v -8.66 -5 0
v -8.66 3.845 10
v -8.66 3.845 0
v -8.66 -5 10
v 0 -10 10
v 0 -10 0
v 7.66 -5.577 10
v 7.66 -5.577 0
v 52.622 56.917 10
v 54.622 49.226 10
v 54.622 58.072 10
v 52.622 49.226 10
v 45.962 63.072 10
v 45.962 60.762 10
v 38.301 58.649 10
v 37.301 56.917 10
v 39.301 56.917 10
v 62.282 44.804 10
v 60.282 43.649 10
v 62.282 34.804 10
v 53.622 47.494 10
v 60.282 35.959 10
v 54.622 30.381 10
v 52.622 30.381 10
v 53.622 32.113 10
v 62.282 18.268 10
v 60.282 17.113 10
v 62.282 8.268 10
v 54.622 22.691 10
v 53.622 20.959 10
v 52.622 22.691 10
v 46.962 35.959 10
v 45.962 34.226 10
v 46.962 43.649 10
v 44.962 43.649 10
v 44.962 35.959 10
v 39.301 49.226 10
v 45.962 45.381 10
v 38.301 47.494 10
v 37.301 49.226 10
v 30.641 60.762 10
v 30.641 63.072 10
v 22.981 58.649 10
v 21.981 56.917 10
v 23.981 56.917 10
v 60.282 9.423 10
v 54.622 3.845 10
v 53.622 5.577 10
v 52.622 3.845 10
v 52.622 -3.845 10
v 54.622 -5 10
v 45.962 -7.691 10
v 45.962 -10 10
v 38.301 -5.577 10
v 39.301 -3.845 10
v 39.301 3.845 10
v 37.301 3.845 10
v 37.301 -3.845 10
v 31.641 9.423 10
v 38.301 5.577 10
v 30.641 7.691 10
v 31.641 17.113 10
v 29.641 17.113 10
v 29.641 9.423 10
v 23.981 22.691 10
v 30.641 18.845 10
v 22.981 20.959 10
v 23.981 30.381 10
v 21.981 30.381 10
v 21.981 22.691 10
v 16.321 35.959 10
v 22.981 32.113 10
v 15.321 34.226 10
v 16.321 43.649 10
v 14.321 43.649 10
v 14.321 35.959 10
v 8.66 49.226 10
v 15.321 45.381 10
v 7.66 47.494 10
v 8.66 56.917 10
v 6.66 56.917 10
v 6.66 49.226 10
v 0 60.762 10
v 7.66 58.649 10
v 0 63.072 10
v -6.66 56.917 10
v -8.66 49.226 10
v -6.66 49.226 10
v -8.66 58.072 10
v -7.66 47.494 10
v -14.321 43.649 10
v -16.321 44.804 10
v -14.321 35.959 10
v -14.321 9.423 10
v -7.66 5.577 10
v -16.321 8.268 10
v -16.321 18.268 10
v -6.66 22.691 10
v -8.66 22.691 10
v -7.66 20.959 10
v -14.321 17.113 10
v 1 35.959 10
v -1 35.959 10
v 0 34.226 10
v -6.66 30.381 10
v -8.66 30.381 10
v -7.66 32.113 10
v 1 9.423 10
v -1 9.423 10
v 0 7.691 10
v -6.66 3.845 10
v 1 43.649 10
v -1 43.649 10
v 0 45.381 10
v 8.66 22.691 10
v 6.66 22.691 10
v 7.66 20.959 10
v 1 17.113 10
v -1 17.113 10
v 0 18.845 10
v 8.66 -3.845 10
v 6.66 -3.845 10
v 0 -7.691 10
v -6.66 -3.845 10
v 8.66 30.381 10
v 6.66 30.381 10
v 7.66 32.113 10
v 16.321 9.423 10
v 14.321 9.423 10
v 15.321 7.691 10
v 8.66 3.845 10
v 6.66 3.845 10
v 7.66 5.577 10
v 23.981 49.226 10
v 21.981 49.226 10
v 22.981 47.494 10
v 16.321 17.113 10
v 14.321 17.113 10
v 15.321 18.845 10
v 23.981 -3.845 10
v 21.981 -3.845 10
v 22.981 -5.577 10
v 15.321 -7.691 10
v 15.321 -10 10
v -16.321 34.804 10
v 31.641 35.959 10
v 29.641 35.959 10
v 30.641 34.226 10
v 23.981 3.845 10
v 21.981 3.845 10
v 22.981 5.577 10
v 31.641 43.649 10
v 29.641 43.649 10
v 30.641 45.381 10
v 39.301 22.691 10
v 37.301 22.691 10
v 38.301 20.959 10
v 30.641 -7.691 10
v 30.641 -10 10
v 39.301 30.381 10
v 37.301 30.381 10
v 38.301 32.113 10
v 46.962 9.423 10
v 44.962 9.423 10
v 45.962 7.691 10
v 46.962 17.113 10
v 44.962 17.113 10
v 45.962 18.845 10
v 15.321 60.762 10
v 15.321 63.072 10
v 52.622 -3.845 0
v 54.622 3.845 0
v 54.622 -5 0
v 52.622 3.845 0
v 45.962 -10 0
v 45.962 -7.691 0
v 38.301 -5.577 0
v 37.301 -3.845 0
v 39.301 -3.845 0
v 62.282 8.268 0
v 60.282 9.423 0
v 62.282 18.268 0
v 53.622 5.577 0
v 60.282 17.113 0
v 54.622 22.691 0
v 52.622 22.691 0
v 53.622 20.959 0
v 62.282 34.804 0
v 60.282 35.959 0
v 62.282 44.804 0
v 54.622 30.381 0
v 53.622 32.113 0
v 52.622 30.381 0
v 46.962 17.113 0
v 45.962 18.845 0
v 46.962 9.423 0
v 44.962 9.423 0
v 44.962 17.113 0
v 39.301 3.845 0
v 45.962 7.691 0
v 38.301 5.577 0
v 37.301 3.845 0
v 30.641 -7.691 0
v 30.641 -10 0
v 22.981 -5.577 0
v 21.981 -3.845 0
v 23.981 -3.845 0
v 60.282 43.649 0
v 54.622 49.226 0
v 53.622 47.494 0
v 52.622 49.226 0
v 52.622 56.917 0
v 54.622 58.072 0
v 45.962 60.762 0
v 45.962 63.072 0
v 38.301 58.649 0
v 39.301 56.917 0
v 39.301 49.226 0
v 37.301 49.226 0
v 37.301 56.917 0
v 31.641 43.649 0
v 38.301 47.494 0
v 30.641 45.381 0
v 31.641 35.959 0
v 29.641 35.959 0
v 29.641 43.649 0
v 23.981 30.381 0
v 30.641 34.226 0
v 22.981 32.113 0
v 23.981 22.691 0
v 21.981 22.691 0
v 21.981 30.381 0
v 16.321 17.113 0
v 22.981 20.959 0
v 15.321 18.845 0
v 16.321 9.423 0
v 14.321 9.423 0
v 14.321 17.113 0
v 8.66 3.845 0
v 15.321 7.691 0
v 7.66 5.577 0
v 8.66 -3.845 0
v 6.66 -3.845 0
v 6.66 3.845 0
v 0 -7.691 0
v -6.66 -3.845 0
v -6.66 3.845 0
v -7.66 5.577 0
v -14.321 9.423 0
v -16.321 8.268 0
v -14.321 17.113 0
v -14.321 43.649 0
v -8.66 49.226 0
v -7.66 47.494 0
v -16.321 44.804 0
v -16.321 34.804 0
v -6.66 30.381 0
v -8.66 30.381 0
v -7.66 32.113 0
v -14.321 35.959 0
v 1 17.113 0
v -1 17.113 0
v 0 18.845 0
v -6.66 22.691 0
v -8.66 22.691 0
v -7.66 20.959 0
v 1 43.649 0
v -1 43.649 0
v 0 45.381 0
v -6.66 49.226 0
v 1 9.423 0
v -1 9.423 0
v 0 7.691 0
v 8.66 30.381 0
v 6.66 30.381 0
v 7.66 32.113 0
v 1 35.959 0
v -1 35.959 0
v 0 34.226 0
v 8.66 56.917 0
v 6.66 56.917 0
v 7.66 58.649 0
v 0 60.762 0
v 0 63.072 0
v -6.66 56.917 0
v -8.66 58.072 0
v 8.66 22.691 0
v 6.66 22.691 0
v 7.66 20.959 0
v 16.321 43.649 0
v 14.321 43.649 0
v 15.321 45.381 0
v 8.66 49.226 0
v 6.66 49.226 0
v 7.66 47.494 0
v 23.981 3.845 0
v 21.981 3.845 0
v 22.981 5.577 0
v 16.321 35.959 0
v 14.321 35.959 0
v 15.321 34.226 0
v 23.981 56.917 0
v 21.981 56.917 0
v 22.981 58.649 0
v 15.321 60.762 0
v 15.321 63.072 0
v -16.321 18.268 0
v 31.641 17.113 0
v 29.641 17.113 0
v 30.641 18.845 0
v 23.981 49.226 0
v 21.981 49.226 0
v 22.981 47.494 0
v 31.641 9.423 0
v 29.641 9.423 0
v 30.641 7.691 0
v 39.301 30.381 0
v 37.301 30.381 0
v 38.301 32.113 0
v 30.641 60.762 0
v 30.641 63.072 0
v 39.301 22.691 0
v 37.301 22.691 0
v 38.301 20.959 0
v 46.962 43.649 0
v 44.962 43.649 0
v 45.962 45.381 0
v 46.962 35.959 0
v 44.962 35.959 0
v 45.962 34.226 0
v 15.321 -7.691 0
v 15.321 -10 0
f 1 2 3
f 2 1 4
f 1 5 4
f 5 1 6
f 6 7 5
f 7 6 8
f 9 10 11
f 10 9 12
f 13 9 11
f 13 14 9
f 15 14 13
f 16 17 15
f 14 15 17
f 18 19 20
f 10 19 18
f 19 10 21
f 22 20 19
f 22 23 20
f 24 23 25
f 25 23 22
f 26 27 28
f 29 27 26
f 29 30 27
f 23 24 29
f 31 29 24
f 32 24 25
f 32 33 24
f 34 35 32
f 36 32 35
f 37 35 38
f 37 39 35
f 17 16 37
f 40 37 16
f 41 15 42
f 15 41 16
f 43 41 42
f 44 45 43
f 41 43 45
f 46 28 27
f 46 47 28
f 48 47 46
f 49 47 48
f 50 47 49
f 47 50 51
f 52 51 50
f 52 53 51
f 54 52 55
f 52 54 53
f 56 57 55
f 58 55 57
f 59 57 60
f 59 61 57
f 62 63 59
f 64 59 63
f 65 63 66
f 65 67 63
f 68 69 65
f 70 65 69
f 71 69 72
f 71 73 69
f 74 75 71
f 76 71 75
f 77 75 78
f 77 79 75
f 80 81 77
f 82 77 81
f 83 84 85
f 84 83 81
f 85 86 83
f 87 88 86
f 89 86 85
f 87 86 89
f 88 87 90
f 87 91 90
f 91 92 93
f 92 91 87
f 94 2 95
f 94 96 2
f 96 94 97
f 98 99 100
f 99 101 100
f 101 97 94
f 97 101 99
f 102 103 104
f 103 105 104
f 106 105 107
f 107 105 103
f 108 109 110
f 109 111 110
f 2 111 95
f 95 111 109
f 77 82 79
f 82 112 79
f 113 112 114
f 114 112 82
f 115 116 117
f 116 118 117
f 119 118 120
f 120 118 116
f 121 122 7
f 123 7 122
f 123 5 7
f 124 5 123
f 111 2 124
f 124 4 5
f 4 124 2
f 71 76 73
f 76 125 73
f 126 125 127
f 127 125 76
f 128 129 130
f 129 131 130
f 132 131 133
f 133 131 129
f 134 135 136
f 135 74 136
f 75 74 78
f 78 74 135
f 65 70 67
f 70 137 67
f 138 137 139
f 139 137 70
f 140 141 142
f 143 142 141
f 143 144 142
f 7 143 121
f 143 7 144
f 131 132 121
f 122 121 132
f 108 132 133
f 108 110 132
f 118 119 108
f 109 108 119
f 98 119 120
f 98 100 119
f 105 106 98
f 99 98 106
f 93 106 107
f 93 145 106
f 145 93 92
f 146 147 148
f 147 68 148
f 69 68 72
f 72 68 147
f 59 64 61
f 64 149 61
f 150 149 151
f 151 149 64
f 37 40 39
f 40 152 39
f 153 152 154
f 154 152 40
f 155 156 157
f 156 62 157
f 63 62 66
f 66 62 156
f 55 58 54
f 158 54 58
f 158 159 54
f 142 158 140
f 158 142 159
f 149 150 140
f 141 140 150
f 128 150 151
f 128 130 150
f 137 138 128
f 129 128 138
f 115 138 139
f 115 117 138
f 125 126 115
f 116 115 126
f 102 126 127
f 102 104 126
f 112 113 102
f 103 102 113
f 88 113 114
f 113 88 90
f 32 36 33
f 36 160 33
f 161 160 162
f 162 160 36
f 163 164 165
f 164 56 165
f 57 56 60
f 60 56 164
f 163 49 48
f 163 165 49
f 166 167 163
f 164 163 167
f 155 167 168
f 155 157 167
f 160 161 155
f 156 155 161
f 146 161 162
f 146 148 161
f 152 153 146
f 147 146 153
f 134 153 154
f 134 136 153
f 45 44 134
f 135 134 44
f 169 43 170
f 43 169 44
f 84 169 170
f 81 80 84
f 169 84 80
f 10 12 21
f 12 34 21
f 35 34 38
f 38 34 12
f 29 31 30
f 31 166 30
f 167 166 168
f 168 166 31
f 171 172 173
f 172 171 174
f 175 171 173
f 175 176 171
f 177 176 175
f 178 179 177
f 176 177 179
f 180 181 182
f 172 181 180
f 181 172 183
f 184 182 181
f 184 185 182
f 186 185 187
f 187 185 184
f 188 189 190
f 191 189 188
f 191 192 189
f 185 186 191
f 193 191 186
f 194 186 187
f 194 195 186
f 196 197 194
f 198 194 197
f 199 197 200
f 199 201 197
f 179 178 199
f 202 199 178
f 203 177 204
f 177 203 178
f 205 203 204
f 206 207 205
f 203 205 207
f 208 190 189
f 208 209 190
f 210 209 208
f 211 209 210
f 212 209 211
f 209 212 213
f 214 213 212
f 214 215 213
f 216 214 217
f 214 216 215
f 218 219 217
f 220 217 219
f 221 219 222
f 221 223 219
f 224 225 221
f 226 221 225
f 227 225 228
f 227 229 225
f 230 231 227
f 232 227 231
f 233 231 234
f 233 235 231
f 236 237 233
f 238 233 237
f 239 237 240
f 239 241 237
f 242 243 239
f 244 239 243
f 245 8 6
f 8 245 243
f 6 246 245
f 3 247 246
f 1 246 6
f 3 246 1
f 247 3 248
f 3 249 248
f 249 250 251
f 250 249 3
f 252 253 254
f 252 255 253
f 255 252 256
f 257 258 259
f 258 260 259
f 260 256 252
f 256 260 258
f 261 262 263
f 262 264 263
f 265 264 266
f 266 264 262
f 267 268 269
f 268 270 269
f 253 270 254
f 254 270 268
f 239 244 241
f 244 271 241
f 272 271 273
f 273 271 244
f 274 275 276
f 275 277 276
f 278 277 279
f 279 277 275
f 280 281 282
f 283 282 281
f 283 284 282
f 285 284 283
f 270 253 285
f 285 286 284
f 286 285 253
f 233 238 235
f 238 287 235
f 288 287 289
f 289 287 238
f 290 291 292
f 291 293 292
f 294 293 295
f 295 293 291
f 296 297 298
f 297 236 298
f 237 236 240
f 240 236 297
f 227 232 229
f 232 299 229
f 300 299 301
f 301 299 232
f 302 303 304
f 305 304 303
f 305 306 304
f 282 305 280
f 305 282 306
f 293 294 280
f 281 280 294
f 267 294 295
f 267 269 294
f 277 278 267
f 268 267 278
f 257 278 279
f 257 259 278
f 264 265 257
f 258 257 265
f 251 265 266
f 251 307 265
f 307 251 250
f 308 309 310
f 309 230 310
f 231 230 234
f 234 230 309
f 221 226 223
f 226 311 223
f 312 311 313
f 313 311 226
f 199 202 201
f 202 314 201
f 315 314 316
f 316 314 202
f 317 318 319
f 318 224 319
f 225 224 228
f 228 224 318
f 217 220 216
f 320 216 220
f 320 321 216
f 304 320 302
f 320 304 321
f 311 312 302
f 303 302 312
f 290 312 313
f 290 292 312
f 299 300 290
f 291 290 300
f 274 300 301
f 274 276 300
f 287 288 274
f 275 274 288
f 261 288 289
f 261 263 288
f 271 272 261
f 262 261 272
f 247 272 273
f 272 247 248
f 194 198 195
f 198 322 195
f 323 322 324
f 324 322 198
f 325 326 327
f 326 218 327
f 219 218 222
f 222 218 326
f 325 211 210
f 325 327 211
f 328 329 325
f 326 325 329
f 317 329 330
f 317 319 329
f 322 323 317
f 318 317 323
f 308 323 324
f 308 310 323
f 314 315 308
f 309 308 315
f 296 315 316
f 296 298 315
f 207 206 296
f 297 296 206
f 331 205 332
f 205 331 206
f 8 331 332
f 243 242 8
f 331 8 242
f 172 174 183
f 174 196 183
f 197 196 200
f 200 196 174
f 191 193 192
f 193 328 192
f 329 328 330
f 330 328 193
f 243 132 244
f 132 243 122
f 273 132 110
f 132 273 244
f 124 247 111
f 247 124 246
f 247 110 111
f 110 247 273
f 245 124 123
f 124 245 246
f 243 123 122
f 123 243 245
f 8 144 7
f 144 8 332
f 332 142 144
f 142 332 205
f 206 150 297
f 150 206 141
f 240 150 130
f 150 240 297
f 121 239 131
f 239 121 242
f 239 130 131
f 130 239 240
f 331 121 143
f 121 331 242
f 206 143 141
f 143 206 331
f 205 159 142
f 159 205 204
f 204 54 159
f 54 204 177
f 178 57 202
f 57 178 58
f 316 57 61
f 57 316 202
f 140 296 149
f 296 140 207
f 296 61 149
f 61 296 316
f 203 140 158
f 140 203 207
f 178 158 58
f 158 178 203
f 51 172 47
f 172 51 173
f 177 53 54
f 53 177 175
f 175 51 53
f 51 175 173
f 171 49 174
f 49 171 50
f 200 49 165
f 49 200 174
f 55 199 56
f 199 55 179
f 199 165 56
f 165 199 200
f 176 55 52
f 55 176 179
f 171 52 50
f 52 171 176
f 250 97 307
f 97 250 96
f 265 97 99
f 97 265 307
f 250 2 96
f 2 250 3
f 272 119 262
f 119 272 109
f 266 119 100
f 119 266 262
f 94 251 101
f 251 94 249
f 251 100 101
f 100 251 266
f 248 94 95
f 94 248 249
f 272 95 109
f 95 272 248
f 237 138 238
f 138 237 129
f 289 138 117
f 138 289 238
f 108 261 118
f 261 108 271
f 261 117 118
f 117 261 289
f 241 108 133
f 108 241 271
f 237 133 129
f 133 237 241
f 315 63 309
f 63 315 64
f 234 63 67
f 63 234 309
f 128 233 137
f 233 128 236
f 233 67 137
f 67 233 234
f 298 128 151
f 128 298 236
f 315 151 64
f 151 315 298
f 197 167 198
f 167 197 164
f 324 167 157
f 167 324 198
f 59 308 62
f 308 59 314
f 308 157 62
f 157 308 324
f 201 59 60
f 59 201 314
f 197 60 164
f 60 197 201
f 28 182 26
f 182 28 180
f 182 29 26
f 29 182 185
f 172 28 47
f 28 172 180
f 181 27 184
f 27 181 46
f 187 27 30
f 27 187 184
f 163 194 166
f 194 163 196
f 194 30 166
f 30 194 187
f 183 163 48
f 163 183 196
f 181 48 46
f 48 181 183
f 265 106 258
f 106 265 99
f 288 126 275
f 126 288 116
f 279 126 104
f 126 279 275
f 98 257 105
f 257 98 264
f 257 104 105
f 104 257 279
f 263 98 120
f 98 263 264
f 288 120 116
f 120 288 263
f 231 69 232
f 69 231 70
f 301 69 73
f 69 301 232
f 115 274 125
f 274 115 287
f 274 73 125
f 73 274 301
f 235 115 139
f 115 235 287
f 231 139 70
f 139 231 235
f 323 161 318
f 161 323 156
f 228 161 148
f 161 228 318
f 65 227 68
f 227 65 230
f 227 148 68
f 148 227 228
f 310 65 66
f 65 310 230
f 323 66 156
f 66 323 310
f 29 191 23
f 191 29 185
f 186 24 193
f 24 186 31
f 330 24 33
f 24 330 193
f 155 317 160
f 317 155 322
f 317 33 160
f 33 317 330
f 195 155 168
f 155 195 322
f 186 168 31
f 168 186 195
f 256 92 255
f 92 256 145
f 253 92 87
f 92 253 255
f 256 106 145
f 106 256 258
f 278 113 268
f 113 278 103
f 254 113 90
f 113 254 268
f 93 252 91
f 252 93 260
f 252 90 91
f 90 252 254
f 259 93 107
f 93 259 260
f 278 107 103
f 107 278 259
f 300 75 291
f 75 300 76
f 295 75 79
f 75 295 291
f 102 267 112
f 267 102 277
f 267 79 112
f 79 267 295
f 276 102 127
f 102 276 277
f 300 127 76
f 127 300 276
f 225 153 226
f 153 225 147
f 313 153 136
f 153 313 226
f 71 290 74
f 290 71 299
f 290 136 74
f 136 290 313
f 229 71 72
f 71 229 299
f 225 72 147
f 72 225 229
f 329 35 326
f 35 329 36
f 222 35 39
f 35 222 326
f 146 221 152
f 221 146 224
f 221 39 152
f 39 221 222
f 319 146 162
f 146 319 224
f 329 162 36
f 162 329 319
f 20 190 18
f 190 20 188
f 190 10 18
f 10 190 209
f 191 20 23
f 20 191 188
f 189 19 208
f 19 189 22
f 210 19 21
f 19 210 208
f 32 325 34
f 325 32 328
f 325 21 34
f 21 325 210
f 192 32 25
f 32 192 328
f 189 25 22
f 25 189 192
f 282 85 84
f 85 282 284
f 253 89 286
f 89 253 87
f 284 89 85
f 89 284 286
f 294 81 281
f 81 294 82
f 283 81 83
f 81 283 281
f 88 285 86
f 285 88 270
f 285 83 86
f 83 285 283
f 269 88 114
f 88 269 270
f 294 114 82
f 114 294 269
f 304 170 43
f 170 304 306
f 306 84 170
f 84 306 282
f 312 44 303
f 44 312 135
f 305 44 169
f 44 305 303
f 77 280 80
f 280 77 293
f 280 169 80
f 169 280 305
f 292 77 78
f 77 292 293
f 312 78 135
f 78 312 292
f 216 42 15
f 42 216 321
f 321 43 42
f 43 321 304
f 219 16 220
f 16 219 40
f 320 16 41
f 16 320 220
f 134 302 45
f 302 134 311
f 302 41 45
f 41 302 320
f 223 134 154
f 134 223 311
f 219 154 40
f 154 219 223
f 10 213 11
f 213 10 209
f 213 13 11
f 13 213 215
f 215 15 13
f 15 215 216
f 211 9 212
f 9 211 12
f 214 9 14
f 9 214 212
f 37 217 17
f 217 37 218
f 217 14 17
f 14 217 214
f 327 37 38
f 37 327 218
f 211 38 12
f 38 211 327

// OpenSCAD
// Honeycomb Structure

// Honeycomb base Unit, 1 cell
// R = radius, outer radius of a cicle enclosing the cross-section hexagon
// H = height, the height of the honeycomb structure
// t = thickness, the wall thickness
module honeycombUnit(R, H, t) {

    T = t / cos(30);
    rotate([0,0,90])
    difference(){
        
        cylinder(r=R, h=H, center=false, $fn=6);
        
        translate([0,0,-1])
        cylinder(r=(R - T), h=(H + 2), center=false, $fn=6);
        
    }
}

//r = 10;
//h = 10;
//t = 2;
//tt = t/cos(30);
//ly = 3*(r-tt/2)*cos(60);
//lx = (r-tt/2)*cos(30);
//
//honeycombUnit(r, h, t);
//translate([lx, ly, 0])
//honeycombUnit(r, h, t);


// X = the number of cells in the X-direction
// Y = the number of cells in the Y-direction
// C = convexity: concave, convex, or half
// First cell is centered on origin (0, 0)
// Structure expands in +X direction, then +Y direction
module honeycombStructure(R, H, t, X, Y, C) {
    
    T = t / cos(30);
    lx = 2*(r-T/2)*cos(30);
    ly = 3*(r-T/2)*cos(60);

    union(){
        
        // Y (# in col direction)
        for (i = [0:1:Y-1])  {
            // X (# in row direction)
            
            // For Concave, Every other row has 1 fewer cells
            if (C=="concave"){
                // Even rows, create X cells
                if (i % 2 == 0) {
                    for (ii = [0:1:X-1]) {
                        translate([ii*lx, i*ly, 0])
                        honeycombUnit(R, H, t);
                    }
                }
                // Odd rows, create X-1 cells
                else if (i % 2 == 1) {
                    for (ii = [0:1:X-2]) {
                        translate([ii*lx + lx/2, i*ly, 0])
                        honeycombUnit(R, H, t);
                    }
                }
            }
            
            else if (C=="half"){
                if (i % 2 == 0) {
                    for (ii = [0:1:X-1]) {
                        translate([ii*lx, i*ly, 0])
                        honeycombUnit(R, H, t);
                    }
                }
                else if (i % 2 == 1) {
                    for (ii = [0:1:X-1]) {
                        translate([ii*lx + lx/2, i*ly, 0])
                        honeycombUnit(R, H, t);
                    }
                }
            }
            
            else if (C=="convex"){
                if (i % 2 == 0) {
                    for (ii = [0:1:X-1]) {
                        translate([ii*lx, i*ly, 0])
                        honeycombUnit(R, H, t);
                    }
                }
                else if (i % 2 == 1) {
                    for (ii = [0:1:X]) {
                        translate([ii*lx-lx/2, i*ly, 0])
                        honeycombUnit(R, H, t);
                    }
                }
            }
            
            else {
            }
            
        }
    }

}
        

r=10;
h=10;
t=2;
X=4;
Y=5;
C="convex";

honeycombStructure(r,h,t,X,Y,C);
